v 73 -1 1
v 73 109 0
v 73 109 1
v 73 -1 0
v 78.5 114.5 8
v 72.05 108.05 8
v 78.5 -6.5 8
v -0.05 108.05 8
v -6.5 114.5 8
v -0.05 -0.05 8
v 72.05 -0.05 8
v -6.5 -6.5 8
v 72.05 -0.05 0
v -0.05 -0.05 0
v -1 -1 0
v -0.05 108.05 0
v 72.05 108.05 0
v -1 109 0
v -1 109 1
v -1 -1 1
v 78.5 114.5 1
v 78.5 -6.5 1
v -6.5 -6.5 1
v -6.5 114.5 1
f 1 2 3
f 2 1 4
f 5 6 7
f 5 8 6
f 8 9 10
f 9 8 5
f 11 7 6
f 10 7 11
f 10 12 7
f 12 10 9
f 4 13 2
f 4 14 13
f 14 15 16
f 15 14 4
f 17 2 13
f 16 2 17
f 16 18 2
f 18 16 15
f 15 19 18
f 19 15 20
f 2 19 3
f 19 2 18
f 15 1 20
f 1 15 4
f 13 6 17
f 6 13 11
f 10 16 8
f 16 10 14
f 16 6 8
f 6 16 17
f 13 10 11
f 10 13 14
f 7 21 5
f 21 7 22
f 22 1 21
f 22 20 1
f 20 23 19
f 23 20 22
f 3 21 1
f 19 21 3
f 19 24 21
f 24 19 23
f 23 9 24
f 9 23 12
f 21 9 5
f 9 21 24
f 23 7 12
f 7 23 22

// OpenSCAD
// Generated by SolidPython 1.0.4 on 2021-01-19 17:41:29


union() {
	difference() {
		translate(v = [-1.0000000000, -1.0000000000, 0]) {
			cube(size = [74.0000000000, 110.0000000000, 8]);
		}
		translate(v = [-0.0500000000, -0.0500000000, 0]) {
			cube(size = [72.1000000000, 108.1000000000, 8]);
		}
	}
	translate(v = [0, 0, 1]) {
		difference() {
			translate(v = [-6.5000000000, -6.5000000000, 0]) {
				cube(size = [85.0000000000, 121.0000000000, 7]);
			}
			translate(v = [-1.0000000000, -1.0000000000, 0]) {
				cube(size = [74.0000000000, 110.0000000000, 7]);
			}
		}
	}
}
